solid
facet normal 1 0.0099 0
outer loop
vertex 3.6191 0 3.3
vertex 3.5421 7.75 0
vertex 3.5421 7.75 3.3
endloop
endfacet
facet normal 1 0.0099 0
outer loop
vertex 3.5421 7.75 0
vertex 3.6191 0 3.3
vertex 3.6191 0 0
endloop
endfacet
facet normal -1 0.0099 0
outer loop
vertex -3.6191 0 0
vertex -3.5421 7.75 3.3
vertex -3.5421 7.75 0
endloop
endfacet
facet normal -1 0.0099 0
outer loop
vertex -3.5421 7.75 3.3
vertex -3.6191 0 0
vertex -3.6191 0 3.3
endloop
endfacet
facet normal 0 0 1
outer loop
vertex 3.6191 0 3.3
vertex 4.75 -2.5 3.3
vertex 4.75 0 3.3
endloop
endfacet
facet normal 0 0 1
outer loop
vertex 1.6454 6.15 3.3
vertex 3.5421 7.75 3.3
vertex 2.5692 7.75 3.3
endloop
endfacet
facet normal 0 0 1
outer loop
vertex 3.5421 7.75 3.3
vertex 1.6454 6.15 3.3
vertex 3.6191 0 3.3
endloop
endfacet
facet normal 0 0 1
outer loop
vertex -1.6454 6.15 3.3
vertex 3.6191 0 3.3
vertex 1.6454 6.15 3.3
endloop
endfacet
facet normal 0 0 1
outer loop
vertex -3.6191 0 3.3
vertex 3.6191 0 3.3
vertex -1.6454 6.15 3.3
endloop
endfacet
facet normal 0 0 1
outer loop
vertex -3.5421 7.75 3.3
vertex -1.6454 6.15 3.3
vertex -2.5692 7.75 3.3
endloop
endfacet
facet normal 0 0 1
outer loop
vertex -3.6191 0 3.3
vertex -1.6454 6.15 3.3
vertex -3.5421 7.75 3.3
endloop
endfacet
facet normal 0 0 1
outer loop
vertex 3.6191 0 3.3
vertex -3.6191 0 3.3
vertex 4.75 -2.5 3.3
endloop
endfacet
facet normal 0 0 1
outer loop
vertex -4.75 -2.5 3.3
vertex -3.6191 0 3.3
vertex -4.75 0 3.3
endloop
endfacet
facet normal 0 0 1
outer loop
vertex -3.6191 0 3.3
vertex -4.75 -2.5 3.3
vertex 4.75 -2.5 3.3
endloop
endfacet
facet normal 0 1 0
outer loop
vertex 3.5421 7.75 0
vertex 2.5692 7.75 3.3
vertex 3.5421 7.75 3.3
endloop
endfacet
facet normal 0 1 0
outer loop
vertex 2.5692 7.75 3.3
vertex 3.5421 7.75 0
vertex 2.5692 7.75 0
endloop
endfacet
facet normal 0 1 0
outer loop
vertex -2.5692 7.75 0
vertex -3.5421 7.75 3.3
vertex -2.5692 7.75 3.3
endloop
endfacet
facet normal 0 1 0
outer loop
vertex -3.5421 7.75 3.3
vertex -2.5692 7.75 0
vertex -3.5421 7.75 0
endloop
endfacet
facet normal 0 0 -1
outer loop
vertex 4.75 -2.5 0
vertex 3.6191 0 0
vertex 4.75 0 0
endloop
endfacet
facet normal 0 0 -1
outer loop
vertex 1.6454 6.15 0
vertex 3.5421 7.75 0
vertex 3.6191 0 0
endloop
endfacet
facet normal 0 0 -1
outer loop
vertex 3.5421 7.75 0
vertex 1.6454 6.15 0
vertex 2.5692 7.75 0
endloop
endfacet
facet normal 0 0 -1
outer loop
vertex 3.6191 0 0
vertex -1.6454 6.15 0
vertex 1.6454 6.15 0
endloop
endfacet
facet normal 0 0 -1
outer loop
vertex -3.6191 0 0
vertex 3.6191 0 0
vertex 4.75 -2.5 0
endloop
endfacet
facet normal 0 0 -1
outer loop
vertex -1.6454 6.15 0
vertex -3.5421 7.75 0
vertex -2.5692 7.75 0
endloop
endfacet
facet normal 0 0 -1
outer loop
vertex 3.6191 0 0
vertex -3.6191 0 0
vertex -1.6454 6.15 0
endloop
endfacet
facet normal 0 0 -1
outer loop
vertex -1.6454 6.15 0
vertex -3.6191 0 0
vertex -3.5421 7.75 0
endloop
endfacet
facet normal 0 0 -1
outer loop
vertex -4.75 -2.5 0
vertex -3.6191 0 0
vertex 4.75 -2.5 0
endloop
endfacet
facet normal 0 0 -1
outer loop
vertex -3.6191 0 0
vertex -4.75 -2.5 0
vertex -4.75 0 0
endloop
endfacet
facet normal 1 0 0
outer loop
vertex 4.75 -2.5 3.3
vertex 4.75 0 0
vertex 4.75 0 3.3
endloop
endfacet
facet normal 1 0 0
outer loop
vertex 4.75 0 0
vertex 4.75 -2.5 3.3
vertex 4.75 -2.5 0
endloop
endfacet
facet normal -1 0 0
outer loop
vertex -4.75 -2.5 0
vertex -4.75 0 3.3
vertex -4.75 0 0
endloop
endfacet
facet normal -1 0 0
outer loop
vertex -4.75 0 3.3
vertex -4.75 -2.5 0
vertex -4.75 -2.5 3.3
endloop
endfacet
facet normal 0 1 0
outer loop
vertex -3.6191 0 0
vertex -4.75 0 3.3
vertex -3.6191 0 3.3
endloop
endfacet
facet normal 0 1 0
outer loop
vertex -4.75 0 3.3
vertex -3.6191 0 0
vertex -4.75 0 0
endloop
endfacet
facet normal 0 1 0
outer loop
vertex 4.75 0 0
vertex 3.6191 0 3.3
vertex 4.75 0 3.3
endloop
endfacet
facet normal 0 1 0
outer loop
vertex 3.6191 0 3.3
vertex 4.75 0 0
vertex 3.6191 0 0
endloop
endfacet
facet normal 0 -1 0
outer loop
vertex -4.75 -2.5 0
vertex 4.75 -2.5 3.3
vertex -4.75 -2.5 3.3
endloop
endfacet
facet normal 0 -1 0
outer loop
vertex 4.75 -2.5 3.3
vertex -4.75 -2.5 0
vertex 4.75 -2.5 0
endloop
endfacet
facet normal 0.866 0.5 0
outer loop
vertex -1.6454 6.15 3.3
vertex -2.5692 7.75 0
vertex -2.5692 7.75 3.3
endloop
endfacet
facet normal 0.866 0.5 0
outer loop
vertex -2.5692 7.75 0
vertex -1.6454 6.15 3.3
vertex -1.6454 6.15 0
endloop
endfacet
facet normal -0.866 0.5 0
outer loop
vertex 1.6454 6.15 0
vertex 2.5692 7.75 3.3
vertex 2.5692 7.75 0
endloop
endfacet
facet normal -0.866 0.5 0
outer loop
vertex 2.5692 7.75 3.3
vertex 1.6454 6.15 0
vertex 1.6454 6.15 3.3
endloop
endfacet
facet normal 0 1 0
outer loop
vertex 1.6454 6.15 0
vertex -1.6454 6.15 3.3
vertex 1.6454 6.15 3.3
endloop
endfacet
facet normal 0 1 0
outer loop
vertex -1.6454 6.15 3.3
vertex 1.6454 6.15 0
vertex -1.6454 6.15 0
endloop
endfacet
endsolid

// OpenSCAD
// Removable side-entry M3 nut keeper. Existing housings are unchanged.
// Trial fit only: no positive latch exists in the old channel.
// Print flat, Z=0 on bed. +Y points into the existing nut channel.
$fn=48;
use <../../engineering/chassis-strength-bench/coupon/drive-motor-inline-module.scad>
use <../modular-test-chassis/modular-chassis-v2.scad>

part="sleeve"; // [motor_short,motor_long,sleeve,preview_sleeve,preview_short,preview_long,qa_motor,qa_sleeve,qa_front_sleeve,qa_nut]
nut_af=5.5; // assumed measured metal nut size; adjust after caliper measurement
nut_clearance=0.20; // total clearance across flats, not per face
channel_af=6.2;
channel_corner_d=channel_af/cos(30);
channel_seat_w=channel_corner_d+0.20;
channel_entry_w=channel_corner_d+0.40;
channel_h=3.7;
side_clearance=0.15;
vertical_clearance=0.20;
keeper_h=channel_h-2*vertical_clearance;
tip_before_axis=1.25; // keep the fork thick; no plastic across screw axis
tab_w=9.5;
tab_depth=2.5;

module keeper(distance=11) {
    tip=distance-tip_before_axis;
    function width_at(y)=channel_seat_w+(channel_entry_w-channel_seat_w)*(distance-y)/(distance+1)-2*side_clearance;
    difference() {
        union() {
            linear_extrude(height=keeper_h)
                polygon([[-width_at(0)/2,-0.05],[width_at(0)/2,-0.05],
                         [width_at(tip)/2,tip],[-width_at(tip)/2,tip]]);
            translate([-tab_w/2,-tab_depth,0]) cube([tab_w,tab_depth,keeper_h]);
        }
        // A through-height near-half hex notch: keeper carries no bolt preload.
        translate([0,distance,-0.1])
            cylinder(d=(nut_af+nut_clearance)/cos(30),h=keeper_h+0.2,$fn=6);
    }
}

module motor_keepers() {
    for (xx=[-15,15]) {
        translate([xx,-25,22.3+vertical_clearance]) keeper(11);
        translate([xx,25,22.3+vertical_clearance]) rotate([0,0,180]) keeper(14);
    }
}

module sleeve_keepers() {
    for (xx=[-30,30],side=[-1,1])
        translate([xx,side*21.5,15.3+vertical_clearance])
            rotate([0,0,side>0 ? 180 : 0]) keeper(9);
}

module front_sleeve_keepers() {
    for (yy=[-15,15],side=[-1,1])
        translate([side*21.5,yy,5.3+vertical_clearance])
            rotate([0,0,side*90]) keeper(9);
}

if (part=="motor_short") keeper(11);
else if (part=="motor_long") keeper(14);
else if (part=="sleeve") keeper(9);
else if (part=="preview_sleeve" || part=="preview_short" || part=="preview_long") {
    distance=part=="preview_sleeve" ? 9 : part=="preview_short" ? 11 : 14;
    color([0.15,0.55,0.8]) keeper(distance);
    color([0.65,0.65,0.65]) translate([0,distance,0.45])
        cylinder(d=nut_af/cos(30),h=2.4,$fn=6);
}
else if (part=="qa_motor") intersection() { drive_motor_inline(1); motor_keepers(); }
else if (part=="qa_sleeve") intersection() { straight_sleeve(); sleeve_keepers(); }
else if (part=="qa_front_sleeve") intersection() { ramp_back_sleeve(); front_sleeve_keepers(); }
else if (part=="qa_nut") intersection() {
    keeper(9);
    translate([0,9,-0.1]) cylinder(d=nut_af/cos(30),h=channel_h+0.2,$fn=6);
}
